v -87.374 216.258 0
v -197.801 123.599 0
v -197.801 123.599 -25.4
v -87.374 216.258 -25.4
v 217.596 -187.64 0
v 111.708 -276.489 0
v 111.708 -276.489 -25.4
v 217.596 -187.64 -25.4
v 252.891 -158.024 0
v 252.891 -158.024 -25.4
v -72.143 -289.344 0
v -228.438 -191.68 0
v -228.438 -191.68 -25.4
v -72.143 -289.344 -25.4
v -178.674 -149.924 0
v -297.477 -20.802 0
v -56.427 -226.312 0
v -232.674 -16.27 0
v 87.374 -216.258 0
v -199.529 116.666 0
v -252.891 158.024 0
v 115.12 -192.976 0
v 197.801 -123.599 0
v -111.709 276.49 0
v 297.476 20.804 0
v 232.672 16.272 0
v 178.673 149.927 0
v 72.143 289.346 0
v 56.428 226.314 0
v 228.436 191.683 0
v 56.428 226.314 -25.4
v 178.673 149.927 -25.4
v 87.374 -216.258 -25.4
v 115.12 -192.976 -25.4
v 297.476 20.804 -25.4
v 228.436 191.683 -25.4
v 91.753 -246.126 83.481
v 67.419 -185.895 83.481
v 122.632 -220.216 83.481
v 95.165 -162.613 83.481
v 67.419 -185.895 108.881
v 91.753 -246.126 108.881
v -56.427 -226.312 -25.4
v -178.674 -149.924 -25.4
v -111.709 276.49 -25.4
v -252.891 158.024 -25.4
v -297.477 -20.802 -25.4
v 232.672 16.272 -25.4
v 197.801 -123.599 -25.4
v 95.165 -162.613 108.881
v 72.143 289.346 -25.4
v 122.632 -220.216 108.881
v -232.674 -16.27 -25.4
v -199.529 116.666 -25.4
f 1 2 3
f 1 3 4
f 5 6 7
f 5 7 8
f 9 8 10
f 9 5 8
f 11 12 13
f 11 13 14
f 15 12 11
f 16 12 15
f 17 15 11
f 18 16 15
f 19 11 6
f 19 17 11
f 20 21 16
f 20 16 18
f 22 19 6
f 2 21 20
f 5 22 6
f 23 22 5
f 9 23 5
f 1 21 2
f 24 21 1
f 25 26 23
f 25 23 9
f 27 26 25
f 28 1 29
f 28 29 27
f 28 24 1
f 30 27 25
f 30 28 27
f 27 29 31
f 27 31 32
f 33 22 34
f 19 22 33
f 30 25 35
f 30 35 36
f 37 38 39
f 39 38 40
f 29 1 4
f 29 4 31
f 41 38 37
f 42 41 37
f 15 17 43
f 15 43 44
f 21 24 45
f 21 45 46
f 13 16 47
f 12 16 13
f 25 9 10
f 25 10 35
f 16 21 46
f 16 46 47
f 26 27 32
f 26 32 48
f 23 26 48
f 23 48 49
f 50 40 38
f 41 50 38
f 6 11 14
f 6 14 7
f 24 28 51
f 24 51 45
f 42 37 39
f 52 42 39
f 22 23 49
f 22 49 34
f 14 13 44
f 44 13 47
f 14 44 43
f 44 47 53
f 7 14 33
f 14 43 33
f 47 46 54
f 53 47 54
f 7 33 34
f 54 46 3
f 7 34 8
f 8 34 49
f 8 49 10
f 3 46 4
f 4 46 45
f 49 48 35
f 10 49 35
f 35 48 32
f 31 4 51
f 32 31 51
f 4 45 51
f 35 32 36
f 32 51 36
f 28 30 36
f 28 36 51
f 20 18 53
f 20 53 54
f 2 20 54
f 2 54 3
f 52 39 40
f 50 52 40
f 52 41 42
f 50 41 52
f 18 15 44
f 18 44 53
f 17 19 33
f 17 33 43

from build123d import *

# Parameters (mm, degrees)
F2_DEPTH = 25.399999693
F6_DEPTH = 25.4


with BuildPart() as f2:
    # F1 (on face) + F0 (on Top) → F2 (new body)
    with BuildSketch(Plane.XY):
        Polygon((-111.7090208536, 276.4895289227), (-252.8909638096, 158.0238126594), (-199.5292903903, 116.6656971275), (-197.8005056994, 123.5994738037), (-87.3740227139, 216.2582949491), align=None)
        Polygon((72.1432911881, 289.3457349723), (-111.7090208536, 276.4895289227), (-87.3740227139, 216.2582949491), (56.4276871958, 226.3138900752), align=None)
        Polygon((252.8912963973, -158.0237002986), (297.475504436, 20.8043405065), (232.672446056, 16.2724183596), (197.8005794587, -123.599250492), (197.8005196319, -123.5994904582), (170.1937765863, -146.7640499688), (217.5955292139, -187.6400479438), align=None)
        Polygon((115.1196894096, -192.9762006665), (142.5870335407, -250.578974095), (182.2997620306, -217.256395589), (217.5955292139, -187.6400479438), (170.1937765863, -146.7640499688), (142.5870335407, -169.9286094794), align=None)
        Polygon((297.475504436, 20.8043405065), (228.4359453683, 191.6832455206), (178.6725658009, 149.9268120649), (232.672446056, 16.2724183596), align=None)
        Polygon((228.4359453683, 191.6832455206), (72.1432911881, 289.3457349723), (56.4276871958, 226.3138900752), (178.6725658009, 149.9268120649), align=None)
        Polygon((-199.5292903903, 116.6656971275), (-252.8909638096, 158.0238126594), (-297.4771540381, -20.8016290079), (-232.6739184998, -16.2701453431), align=None)
        Polygon((-178.6742984099, -149.9238951169), (-228.4376779774, -191.6803285726), (-72.1427644082, -289.3442298472), (-56.4270076022, -226.3124804387), align=None)
        Polygon((-232.6739184998, -16.2701453431), (-297.4771540381, -20.8016290079), (-228.4376779774, -191.6803285726), (-178.6742984099, -149.9238951169), align=None)
    with BuildSketch(Plane.XY):
        Polygon((87.3735474494, -216.2577285007), (-56.4270076022, -226.3124804387), (-72.1427644082, -289.3442298472), (111.708227664, -276.4890908793), align=None)
        Polygon((115.1196894096, -192.9762006665), (87.3735474494, -216.2577285007), (111.708227664, -276.4890908793), (142.5870335407, -250.578974095), align=None)
    extrude(amount=-F2_DEPTH)


with BuildPart() as f6:
    # F5 (on offset) → F6 (new body)
    with BuildSketch(Plane.XY.offset(83.4812130779)):
        Polygon((95.1647471272, -162.6130449808), (67.418605167, -185.894572815), (91.7532853816, -246.1259351936), (122.6320912583, -220.2158184093), align=None)
    extrude(amount=F6_DEPTH)


solid = Compound([f2.part, f6.part])
